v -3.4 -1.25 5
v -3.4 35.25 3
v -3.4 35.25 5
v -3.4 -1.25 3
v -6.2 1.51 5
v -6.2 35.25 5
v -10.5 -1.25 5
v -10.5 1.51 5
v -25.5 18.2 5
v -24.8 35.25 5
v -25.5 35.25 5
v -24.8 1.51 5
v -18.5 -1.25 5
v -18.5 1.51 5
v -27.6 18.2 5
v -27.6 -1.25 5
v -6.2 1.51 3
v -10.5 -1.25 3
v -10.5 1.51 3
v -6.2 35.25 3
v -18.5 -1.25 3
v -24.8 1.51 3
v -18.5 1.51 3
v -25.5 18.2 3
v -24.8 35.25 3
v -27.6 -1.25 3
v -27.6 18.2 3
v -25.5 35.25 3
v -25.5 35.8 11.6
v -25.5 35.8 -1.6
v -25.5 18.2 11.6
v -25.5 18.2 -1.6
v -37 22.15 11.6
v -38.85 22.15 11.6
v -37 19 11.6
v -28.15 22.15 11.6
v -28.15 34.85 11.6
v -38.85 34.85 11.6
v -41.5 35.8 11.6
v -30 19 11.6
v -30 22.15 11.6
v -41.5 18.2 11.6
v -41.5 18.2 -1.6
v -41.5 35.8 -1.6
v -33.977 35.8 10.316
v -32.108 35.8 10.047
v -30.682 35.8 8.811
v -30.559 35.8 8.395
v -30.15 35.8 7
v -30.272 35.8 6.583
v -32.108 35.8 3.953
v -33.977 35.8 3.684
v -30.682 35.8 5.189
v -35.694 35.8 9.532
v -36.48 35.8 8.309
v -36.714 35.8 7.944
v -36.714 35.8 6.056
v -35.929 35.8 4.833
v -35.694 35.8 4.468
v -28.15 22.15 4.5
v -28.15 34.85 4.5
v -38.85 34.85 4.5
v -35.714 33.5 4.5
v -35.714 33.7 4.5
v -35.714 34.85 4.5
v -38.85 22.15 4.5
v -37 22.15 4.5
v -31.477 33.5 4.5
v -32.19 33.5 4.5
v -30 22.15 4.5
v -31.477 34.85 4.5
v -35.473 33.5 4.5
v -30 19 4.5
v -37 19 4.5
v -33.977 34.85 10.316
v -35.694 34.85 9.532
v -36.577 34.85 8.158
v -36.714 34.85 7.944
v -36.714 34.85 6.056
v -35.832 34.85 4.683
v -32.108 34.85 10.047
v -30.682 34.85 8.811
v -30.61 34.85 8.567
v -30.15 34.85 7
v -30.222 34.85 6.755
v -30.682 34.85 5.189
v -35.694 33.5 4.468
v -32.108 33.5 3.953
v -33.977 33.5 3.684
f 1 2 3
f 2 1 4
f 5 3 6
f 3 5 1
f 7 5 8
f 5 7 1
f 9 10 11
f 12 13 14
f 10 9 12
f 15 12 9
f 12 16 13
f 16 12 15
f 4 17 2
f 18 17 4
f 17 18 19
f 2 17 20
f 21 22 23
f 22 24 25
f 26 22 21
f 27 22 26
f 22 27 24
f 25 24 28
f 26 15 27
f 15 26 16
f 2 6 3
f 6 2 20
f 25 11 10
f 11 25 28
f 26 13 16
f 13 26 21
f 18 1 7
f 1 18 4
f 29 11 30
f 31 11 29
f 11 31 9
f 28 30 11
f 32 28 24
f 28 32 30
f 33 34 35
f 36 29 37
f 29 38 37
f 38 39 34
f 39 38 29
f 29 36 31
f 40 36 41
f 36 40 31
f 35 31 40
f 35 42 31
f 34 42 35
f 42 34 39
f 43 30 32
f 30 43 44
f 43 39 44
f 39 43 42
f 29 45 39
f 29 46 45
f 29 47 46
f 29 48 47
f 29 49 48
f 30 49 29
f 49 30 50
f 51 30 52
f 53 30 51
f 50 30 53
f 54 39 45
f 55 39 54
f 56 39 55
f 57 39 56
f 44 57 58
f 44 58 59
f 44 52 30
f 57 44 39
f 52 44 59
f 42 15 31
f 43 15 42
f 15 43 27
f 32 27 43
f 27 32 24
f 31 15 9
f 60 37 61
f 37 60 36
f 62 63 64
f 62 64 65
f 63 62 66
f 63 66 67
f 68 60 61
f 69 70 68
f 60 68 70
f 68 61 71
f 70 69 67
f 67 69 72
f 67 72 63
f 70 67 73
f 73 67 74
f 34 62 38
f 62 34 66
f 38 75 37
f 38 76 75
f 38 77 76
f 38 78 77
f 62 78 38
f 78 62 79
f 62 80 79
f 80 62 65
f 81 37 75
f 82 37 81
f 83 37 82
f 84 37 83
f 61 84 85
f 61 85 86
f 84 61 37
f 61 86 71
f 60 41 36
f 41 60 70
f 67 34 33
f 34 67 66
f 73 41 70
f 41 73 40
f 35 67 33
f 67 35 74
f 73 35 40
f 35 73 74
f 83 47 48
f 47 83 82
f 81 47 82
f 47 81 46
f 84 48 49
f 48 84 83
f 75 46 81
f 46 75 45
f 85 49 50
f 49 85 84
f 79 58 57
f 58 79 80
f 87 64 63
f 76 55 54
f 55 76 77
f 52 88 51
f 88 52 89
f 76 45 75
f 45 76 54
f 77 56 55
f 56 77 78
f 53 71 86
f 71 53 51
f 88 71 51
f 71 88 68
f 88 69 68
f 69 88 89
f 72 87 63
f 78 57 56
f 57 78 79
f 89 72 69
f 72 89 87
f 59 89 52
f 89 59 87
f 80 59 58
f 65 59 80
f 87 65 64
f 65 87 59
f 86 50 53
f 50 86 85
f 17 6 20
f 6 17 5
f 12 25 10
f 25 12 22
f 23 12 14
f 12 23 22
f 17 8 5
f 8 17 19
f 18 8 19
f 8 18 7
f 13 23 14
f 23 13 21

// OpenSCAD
difference () {
  union () {
    translate ([-15.5, 17, 4]) {
      difference () {
        cube ([24.2, 36.5, 2.0], center=true);
        translate ([0, 0, 2]) {
        }
      }
    }
    translate ([-33.5, 27.0, 5]) {
      difference () {
        cube ([16.0, 17.6, 13.2], center=true);
      }
    }
  }
  translate ([0, 1.5, 0]) {
    union () {
      translate ([-33.5, 27.0, 10.0]) {
        cube ([10.7, 12.7, 11], center=true);
      }
      translate ([-33.5, 20.5, 8.5]) {
        cube ([7.0, 6.0, 8.0], center=true);
      }
      translate ([-33.5, 37.0, 7]) {
        rotate (a=90.0002104591497, v=[1, 0, 0]) {
          cylinder (h=10, r=3.35, center=true);
        }
      }
    }
    translate ([0, 0, 0]) {
      translate ([0, 0, 2]) {
        union () {
          translate ([-15.5, 17, 4.5]) {
            cube ([18.6, 33.98, 9.5], center=true);
          }
          translate ([-14.5, -1, 4.75]) {
            cube ([8.0, 10.6, 9.5], center=true);
          }
          translate ([-15.5, 27, 3.55]) {
            cube ([10.6, 35.6, 4], center=true);
          }
        }
      }
    }
  }
}
